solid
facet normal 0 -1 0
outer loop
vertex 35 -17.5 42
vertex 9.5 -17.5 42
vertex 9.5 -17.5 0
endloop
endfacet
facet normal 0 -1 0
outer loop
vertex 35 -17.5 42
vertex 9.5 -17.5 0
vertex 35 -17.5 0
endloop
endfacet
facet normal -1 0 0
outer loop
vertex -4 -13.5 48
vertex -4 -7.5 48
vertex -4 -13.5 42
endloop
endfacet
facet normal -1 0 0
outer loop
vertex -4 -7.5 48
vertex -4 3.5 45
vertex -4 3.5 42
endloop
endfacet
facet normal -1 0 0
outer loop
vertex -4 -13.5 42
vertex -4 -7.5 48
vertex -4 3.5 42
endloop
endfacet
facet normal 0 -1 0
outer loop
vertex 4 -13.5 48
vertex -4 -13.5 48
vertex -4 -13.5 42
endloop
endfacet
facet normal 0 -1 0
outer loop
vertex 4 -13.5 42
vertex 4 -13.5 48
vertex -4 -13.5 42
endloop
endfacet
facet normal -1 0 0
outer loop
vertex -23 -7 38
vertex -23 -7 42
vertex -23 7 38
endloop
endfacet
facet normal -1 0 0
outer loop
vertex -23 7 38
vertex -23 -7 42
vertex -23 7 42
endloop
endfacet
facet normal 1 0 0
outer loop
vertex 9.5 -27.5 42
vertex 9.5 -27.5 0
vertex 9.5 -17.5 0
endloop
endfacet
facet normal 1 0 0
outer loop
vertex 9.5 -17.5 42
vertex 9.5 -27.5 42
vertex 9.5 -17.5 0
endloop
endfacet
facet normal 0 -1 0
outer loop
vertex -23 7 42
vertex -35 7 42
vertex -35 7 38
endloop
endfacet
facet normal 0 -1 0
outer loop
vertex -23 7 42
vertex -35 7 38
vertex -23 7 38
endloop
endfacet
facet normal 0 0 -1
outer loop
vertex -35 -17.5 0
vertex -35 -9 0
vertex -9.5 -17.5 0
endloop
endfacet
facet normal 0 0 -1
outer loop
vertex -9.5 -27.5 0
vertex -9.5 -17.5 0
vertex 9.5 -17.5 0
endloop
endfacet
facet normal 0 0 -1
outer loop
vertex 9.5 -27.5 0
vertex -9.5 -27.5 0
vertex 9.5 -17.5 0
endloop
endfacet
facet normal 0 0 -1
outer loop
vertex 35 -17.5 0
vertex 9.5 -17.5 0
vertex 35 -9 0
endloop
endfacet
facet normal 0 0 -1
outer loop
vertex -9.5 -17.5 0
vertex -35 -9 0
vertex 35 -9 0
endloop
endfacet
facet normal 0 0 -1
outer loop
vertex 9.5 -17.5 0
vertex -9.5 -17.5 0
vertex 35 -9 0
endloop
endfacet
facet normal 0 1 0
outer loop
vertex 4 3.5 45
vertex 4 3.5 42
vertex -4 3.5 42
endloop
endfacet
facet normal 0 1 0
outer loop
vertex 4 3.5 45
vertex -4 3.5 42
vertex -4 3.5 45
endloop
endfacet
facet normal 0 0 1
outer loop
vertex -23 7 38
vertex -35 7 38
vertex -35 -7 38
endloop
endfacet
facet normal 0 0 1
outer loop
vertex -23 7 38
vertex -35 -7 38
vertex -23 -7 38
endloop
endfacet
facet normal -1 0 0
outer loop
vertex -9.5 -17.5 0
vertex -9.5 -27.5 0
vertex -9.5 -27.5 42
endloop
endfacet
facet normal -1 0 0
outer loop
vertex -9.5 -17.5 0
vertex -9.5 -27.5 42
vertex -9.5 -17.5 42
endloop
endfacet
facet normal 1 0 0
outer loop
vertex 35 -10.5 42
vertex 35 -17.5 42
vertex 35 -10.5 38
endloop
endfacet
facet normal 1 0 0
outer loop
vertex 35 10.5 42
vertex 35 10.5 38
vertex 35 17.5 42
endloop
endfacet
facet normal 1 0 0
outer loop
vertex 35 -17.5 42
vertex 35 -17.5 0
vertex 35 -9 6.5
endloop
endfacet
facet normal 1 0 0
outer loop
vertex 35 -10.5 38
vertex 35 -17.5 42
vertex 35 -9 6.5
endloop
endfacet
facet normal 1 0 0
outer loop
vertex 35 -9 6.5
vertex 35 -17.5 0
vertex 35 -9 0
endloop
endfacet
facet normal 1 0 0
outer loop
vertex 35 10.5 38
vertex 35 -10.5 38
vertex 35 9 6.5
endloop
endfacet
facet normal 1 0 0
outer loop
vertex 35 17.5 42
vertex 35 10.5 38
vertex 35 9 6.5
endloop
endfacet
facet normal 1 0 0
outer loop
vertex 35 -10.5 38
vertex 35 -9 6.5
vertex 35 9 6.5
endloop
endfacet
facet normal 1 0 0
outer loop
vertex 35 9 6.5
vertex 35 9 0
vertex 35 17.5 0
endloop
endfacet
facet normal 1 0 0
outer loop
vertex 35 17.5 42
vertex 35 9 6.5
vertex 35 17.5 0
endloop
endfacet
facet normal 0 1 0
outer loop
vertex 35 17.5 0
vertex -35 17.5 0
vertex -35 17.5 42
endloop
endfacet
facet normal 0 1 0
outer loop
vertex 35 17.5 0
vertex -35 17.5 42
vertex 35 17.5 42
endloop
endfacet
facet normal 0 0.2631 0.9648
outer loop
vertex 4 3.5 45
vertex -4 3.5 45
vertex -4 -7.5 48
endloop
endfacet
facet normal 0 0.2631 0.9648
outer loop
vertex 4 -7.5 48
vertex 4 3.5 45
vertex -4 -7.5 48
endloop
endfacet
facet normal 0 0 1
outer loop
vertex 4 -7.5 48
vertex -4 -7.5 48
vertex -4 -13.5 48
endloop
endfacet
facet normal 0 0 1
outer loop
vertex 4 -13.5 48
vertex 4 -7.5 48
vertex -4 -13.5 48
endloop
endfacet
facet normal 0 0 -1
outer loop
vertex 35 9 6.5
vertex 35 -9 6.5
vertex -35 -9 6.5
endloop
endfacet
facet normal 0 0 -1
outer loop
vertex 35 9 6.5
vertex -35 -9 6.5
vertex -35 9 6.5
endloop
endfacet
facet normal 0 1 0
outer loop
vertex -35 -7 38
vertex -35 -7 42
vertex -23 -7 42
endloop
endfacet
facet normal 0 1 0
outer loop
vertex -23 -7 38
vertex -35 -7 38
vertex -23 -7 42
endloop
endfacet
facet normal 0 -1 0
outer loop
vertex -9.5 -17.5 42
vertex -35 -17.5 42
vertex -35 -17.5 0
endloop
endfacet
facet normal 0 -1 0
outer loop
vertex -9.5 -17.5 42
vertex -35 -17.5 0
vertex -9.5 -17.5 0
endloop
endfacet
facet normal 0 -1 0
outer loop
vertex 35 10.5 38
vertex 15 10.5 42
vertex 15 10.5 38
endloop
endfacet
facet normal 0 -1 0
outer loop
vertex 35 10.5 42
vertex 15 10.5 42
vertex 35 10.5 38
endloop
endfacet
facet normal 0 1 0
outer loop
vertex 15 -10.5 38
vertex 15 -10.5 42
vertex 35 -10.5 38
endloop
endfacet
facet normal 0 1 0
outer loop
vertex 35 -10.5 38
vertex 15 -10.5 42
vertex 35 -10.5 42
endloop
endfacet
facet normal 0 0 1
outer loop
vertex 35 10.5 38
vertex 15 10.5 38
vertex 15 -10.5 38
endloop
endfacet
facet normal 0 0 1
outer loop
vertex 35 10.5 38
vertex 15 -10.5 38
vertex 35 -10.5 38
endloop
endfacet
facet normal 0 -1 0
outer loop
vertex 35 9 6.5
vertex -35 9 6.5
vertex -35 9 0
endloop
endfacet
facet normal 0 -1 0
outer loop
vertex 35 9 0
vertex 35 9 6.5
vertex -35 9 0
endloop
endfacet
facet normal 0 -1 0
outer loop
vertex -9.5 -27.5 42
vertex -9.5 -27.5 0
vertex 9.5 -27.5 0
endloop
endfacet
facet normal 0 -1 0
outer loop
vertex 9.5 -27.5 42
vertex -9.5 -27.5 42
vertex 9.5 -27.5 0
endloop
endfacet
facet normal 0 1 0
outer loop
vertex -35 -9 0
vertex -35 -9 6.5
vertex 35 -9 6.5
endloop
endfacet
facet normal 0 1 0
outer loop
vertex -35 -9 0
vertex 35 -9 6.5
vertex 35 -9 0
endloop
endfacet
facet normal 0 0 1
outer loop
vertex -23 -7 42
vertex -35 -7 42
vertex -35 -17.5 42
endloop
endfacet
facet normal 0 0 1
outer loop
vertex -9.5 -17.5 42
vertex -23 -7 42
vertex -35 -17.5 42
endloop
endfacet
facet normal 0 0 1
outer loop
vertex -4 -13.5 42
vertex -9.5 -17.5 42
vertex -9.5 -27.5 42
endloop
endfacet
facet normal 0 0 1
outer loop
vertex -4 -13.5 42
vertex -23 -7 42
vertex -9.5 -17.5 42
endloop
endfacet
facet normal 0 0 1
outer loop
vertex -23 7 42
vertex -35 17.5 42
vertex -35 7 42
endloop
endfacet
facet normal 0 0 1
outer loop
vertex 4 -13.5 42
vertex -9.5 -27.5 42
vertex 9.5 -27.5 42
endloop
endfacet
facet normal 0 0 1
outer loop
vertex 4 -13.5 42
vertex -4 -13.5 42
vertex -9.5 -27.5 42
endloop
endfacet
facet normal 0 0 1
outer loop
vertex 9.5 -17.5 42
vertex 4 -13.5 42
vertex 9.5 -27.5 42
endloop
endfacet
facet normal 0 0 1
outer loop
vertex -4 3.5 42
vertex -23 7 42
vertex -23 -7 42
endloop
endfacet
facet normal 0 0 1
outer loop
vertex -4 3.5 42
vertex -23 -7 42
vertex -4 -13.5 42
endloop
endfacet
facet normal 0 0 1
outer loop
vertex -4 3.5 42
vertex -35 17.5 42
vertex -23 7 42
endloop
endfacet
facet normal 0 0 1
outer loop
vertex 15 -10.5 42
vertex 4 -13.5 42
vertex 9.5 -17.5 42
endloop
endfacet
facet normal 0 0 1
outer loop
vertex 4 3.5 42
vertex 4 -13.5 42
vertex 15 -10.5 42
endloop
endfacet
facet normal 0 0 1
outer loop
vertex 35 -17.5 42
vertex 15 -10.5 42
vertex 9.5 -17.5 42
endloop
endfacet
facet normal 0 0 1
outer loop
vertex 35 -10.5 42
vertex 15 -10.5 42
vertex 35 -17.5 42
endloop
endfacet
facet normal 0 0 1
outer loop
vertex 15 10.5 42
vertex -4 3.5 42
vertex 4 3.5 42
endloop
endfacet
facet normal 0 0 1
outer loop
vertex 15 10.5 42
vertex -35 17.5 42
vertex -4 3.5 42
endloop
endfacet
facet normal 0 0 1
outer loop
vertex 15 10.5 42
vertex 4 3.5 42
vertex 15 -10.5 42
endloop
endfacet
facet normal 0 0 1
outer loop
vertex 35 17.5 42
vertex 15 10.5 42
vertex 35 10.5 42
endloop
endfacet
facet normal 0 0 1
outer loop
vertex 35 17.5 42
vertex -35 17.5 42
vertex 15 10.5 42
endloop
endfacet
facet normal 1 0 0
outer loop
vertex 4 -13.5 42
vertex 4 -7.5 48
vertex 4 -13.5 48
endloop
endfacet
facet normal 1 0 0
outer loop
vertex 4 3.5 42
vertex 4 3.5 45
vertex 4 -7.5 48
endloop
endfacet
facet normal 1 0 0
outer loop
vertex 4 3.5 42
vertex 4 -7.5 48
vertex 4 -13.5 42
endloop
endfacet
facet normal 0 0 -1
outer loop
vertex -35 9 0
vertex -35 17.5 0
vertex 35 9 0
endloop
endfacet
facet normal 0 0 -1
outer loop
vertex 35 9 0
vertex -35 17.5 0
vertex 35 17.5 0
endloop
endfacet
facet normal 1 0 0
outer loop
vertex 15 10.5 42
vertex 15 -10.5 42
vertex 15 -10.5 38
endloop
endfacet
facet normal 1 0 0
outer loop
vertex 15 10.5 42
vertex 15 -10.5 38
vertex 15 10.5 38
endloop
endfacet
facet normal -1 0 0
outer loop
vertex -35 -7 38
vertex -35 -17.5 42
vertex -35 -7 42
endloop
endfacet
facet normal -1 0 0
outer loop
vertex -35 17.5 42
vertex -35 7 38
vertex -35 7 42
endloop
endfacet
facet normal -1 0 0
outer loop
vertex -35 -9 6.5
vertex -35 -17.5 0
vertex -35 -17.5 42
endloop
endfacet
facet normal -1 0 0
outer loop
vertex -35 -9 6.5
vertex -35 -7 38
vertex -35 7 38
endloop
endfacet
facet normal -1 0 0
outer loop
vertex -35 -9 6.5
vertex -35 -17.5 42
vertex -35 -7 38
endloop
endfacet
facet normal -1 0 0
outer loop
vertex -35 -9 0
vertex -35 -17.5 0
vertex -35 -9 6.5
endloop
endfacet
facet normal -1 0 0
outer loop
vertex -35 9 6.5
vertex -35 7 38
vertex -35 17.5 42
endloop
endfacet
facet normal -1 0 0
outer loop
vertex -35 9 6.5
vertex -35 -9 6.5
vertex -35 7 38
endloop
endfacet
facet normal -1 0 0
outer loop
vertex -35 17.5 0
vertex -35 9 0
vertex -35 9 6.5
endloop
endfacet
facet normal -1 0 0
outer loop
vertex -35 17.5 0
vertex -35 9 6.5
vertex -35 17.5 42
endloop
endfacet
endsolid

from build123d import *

# Parameters (mm, degrees)
SKETCH_1_W           = 19
SKETCH_1_H           = 10
SKETCH_1_W_2         = 70
SKETCH_1_H_2         = 35
EXTRUDE_1_DEPTH      = 42
SKETCH_2_W           = 6.5
SKETCH_2_H           = 18
CUT_EXTRUDE_1_DEPTH  = 87.140872993
SKETCH_3_W           = 20
SKETCH_3_H           = 21
SKETCH_3_W_2         = 12
SKETCH_3_H_2         = 14
CUT_EXTRUDE_2_DEPTH  = 4
EXTRUDE_2_DEPTH      = 4
EXTRUDE_2_DEPTH_BACK = 4


with BuildPart() as part:
    # Эскиз1 → Бобышка-Вытянуть1 (new body)
    with BuildSketch(Plane.XY):
        with Locations((0, -22.5)):
            Rectangle(SKETCH_1_W, SKETCH_1_H)
        Rectangle(SKETCH_1_W_2, SKETCH_1_H_2)
    extrude(amount=EXTRUDE_1_DEPTH)

    # Эскиз2 → Вырез-Вытянуть1 (cut, through all)
    with BuildSketch(Plane(origin=(35, 0, 0), x_dir=(0, 0, -1), z_dir=(1, 0, 0))):
        with Locations((-3.25, 0)):
            Rectangle(SKETCH_2_W, SKETCH_2_H)
    extrude(amount=-CUT_EXTRUDE_1_DEPTH, mode=Mode.SUBTRACT)

    # Эскиз3 → Вырез-Вытянуть2 (cut)
    with BuildSketch(Plane.XY.offset(42)):
        with Locations((25, 0)):
            Rectangle(SKETCH_3_W, SKETCH_3_H)
        with Locations((-29, 0)):
            Rectangle(SKETCH_3_W_2, SKETCH_3_H_2)
    extrude(amount=-CUT_EXTRUDE_2_DEPTH, mode=Mode.SUBTRACT)

    # Эскиз4 → Бобышка-Вытянуть2 (add, two sides: drawn at the far end of the back side and taken through both)
    with BuildSketch(Plane(origin=(0, 0, 0), x_dir=(0, 0, -1), z_dir=(1, 0, 0)).offset(-EXTRUDE_2_DEPTH_BACK)):
        Polygon((-48, -13.5), (-42, -13.5), (-42, 3.5), (-45, 3.5), (-48, -7.5), align=None)
    extrude(amount=EXTRUDE_2_DEPTH + EXTRUDE_2_DEPTH_BACK)


solid = part.part
